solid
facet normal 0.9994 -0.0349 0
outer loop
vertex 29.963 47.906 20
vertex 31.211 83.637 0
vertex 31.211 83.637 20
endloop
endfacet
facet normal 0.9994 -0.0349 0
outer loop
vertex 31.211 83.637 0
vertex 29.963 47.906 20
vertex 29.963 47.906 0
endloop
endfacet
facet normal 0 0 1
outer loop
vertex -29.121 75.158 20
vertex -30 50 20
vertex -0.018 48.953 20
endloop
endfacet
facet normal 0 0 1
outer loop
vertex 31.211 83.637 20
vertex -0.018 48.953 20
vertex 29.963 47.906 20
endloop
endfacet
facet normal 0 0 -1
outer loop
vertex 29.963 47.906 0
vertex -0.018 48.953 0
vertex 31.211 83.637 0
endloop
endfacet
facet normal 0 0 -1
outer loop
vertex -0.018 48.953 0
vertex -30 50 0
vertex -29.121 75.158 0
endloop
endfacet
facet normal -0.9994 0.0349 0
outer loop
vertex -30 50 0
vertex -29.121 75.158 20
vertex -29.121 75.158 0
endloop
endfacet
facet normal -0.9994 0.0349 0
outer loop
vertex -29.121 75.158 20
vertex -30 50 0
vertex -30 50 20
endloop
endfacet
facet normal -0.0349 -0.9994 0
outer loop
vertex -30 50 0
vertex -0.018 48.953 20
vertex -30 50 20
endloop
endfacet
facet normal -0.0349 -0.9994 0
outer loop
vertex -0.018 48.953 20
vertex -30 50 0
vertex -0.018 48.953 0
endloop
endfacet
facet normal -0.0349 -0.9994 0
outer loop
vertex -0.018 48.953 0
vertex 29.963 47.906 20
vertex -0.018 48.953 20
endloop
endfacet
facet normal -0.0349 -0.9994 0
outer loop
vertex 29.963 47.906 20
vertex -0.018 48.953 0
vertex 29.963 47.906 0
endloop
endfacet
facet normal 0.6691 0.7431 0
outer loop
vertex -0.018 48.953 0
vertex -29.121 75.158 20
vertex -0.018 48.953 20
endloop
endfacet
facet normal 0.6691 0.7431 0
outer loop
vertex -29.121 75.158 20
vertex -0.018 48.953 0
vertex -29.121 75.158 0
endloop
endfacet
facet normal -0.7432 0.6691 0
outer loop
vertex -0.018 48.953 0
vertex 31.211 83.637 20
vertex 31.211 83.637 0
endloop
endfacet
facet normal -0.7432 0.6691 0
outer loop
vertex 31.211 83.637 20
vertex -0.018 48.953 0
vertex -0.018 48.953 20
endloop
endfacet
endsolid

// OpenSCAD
translate([-30,50,0])
scale([3,3,1])
rotate([0,0,-2]) {
    difference() {
        cube([20, 20, 20]);
        translate([10, 0, -1]) {
            rotate([0,0,50]) {
                cube([30, 30, 30]);
            }
        }
    }
}
